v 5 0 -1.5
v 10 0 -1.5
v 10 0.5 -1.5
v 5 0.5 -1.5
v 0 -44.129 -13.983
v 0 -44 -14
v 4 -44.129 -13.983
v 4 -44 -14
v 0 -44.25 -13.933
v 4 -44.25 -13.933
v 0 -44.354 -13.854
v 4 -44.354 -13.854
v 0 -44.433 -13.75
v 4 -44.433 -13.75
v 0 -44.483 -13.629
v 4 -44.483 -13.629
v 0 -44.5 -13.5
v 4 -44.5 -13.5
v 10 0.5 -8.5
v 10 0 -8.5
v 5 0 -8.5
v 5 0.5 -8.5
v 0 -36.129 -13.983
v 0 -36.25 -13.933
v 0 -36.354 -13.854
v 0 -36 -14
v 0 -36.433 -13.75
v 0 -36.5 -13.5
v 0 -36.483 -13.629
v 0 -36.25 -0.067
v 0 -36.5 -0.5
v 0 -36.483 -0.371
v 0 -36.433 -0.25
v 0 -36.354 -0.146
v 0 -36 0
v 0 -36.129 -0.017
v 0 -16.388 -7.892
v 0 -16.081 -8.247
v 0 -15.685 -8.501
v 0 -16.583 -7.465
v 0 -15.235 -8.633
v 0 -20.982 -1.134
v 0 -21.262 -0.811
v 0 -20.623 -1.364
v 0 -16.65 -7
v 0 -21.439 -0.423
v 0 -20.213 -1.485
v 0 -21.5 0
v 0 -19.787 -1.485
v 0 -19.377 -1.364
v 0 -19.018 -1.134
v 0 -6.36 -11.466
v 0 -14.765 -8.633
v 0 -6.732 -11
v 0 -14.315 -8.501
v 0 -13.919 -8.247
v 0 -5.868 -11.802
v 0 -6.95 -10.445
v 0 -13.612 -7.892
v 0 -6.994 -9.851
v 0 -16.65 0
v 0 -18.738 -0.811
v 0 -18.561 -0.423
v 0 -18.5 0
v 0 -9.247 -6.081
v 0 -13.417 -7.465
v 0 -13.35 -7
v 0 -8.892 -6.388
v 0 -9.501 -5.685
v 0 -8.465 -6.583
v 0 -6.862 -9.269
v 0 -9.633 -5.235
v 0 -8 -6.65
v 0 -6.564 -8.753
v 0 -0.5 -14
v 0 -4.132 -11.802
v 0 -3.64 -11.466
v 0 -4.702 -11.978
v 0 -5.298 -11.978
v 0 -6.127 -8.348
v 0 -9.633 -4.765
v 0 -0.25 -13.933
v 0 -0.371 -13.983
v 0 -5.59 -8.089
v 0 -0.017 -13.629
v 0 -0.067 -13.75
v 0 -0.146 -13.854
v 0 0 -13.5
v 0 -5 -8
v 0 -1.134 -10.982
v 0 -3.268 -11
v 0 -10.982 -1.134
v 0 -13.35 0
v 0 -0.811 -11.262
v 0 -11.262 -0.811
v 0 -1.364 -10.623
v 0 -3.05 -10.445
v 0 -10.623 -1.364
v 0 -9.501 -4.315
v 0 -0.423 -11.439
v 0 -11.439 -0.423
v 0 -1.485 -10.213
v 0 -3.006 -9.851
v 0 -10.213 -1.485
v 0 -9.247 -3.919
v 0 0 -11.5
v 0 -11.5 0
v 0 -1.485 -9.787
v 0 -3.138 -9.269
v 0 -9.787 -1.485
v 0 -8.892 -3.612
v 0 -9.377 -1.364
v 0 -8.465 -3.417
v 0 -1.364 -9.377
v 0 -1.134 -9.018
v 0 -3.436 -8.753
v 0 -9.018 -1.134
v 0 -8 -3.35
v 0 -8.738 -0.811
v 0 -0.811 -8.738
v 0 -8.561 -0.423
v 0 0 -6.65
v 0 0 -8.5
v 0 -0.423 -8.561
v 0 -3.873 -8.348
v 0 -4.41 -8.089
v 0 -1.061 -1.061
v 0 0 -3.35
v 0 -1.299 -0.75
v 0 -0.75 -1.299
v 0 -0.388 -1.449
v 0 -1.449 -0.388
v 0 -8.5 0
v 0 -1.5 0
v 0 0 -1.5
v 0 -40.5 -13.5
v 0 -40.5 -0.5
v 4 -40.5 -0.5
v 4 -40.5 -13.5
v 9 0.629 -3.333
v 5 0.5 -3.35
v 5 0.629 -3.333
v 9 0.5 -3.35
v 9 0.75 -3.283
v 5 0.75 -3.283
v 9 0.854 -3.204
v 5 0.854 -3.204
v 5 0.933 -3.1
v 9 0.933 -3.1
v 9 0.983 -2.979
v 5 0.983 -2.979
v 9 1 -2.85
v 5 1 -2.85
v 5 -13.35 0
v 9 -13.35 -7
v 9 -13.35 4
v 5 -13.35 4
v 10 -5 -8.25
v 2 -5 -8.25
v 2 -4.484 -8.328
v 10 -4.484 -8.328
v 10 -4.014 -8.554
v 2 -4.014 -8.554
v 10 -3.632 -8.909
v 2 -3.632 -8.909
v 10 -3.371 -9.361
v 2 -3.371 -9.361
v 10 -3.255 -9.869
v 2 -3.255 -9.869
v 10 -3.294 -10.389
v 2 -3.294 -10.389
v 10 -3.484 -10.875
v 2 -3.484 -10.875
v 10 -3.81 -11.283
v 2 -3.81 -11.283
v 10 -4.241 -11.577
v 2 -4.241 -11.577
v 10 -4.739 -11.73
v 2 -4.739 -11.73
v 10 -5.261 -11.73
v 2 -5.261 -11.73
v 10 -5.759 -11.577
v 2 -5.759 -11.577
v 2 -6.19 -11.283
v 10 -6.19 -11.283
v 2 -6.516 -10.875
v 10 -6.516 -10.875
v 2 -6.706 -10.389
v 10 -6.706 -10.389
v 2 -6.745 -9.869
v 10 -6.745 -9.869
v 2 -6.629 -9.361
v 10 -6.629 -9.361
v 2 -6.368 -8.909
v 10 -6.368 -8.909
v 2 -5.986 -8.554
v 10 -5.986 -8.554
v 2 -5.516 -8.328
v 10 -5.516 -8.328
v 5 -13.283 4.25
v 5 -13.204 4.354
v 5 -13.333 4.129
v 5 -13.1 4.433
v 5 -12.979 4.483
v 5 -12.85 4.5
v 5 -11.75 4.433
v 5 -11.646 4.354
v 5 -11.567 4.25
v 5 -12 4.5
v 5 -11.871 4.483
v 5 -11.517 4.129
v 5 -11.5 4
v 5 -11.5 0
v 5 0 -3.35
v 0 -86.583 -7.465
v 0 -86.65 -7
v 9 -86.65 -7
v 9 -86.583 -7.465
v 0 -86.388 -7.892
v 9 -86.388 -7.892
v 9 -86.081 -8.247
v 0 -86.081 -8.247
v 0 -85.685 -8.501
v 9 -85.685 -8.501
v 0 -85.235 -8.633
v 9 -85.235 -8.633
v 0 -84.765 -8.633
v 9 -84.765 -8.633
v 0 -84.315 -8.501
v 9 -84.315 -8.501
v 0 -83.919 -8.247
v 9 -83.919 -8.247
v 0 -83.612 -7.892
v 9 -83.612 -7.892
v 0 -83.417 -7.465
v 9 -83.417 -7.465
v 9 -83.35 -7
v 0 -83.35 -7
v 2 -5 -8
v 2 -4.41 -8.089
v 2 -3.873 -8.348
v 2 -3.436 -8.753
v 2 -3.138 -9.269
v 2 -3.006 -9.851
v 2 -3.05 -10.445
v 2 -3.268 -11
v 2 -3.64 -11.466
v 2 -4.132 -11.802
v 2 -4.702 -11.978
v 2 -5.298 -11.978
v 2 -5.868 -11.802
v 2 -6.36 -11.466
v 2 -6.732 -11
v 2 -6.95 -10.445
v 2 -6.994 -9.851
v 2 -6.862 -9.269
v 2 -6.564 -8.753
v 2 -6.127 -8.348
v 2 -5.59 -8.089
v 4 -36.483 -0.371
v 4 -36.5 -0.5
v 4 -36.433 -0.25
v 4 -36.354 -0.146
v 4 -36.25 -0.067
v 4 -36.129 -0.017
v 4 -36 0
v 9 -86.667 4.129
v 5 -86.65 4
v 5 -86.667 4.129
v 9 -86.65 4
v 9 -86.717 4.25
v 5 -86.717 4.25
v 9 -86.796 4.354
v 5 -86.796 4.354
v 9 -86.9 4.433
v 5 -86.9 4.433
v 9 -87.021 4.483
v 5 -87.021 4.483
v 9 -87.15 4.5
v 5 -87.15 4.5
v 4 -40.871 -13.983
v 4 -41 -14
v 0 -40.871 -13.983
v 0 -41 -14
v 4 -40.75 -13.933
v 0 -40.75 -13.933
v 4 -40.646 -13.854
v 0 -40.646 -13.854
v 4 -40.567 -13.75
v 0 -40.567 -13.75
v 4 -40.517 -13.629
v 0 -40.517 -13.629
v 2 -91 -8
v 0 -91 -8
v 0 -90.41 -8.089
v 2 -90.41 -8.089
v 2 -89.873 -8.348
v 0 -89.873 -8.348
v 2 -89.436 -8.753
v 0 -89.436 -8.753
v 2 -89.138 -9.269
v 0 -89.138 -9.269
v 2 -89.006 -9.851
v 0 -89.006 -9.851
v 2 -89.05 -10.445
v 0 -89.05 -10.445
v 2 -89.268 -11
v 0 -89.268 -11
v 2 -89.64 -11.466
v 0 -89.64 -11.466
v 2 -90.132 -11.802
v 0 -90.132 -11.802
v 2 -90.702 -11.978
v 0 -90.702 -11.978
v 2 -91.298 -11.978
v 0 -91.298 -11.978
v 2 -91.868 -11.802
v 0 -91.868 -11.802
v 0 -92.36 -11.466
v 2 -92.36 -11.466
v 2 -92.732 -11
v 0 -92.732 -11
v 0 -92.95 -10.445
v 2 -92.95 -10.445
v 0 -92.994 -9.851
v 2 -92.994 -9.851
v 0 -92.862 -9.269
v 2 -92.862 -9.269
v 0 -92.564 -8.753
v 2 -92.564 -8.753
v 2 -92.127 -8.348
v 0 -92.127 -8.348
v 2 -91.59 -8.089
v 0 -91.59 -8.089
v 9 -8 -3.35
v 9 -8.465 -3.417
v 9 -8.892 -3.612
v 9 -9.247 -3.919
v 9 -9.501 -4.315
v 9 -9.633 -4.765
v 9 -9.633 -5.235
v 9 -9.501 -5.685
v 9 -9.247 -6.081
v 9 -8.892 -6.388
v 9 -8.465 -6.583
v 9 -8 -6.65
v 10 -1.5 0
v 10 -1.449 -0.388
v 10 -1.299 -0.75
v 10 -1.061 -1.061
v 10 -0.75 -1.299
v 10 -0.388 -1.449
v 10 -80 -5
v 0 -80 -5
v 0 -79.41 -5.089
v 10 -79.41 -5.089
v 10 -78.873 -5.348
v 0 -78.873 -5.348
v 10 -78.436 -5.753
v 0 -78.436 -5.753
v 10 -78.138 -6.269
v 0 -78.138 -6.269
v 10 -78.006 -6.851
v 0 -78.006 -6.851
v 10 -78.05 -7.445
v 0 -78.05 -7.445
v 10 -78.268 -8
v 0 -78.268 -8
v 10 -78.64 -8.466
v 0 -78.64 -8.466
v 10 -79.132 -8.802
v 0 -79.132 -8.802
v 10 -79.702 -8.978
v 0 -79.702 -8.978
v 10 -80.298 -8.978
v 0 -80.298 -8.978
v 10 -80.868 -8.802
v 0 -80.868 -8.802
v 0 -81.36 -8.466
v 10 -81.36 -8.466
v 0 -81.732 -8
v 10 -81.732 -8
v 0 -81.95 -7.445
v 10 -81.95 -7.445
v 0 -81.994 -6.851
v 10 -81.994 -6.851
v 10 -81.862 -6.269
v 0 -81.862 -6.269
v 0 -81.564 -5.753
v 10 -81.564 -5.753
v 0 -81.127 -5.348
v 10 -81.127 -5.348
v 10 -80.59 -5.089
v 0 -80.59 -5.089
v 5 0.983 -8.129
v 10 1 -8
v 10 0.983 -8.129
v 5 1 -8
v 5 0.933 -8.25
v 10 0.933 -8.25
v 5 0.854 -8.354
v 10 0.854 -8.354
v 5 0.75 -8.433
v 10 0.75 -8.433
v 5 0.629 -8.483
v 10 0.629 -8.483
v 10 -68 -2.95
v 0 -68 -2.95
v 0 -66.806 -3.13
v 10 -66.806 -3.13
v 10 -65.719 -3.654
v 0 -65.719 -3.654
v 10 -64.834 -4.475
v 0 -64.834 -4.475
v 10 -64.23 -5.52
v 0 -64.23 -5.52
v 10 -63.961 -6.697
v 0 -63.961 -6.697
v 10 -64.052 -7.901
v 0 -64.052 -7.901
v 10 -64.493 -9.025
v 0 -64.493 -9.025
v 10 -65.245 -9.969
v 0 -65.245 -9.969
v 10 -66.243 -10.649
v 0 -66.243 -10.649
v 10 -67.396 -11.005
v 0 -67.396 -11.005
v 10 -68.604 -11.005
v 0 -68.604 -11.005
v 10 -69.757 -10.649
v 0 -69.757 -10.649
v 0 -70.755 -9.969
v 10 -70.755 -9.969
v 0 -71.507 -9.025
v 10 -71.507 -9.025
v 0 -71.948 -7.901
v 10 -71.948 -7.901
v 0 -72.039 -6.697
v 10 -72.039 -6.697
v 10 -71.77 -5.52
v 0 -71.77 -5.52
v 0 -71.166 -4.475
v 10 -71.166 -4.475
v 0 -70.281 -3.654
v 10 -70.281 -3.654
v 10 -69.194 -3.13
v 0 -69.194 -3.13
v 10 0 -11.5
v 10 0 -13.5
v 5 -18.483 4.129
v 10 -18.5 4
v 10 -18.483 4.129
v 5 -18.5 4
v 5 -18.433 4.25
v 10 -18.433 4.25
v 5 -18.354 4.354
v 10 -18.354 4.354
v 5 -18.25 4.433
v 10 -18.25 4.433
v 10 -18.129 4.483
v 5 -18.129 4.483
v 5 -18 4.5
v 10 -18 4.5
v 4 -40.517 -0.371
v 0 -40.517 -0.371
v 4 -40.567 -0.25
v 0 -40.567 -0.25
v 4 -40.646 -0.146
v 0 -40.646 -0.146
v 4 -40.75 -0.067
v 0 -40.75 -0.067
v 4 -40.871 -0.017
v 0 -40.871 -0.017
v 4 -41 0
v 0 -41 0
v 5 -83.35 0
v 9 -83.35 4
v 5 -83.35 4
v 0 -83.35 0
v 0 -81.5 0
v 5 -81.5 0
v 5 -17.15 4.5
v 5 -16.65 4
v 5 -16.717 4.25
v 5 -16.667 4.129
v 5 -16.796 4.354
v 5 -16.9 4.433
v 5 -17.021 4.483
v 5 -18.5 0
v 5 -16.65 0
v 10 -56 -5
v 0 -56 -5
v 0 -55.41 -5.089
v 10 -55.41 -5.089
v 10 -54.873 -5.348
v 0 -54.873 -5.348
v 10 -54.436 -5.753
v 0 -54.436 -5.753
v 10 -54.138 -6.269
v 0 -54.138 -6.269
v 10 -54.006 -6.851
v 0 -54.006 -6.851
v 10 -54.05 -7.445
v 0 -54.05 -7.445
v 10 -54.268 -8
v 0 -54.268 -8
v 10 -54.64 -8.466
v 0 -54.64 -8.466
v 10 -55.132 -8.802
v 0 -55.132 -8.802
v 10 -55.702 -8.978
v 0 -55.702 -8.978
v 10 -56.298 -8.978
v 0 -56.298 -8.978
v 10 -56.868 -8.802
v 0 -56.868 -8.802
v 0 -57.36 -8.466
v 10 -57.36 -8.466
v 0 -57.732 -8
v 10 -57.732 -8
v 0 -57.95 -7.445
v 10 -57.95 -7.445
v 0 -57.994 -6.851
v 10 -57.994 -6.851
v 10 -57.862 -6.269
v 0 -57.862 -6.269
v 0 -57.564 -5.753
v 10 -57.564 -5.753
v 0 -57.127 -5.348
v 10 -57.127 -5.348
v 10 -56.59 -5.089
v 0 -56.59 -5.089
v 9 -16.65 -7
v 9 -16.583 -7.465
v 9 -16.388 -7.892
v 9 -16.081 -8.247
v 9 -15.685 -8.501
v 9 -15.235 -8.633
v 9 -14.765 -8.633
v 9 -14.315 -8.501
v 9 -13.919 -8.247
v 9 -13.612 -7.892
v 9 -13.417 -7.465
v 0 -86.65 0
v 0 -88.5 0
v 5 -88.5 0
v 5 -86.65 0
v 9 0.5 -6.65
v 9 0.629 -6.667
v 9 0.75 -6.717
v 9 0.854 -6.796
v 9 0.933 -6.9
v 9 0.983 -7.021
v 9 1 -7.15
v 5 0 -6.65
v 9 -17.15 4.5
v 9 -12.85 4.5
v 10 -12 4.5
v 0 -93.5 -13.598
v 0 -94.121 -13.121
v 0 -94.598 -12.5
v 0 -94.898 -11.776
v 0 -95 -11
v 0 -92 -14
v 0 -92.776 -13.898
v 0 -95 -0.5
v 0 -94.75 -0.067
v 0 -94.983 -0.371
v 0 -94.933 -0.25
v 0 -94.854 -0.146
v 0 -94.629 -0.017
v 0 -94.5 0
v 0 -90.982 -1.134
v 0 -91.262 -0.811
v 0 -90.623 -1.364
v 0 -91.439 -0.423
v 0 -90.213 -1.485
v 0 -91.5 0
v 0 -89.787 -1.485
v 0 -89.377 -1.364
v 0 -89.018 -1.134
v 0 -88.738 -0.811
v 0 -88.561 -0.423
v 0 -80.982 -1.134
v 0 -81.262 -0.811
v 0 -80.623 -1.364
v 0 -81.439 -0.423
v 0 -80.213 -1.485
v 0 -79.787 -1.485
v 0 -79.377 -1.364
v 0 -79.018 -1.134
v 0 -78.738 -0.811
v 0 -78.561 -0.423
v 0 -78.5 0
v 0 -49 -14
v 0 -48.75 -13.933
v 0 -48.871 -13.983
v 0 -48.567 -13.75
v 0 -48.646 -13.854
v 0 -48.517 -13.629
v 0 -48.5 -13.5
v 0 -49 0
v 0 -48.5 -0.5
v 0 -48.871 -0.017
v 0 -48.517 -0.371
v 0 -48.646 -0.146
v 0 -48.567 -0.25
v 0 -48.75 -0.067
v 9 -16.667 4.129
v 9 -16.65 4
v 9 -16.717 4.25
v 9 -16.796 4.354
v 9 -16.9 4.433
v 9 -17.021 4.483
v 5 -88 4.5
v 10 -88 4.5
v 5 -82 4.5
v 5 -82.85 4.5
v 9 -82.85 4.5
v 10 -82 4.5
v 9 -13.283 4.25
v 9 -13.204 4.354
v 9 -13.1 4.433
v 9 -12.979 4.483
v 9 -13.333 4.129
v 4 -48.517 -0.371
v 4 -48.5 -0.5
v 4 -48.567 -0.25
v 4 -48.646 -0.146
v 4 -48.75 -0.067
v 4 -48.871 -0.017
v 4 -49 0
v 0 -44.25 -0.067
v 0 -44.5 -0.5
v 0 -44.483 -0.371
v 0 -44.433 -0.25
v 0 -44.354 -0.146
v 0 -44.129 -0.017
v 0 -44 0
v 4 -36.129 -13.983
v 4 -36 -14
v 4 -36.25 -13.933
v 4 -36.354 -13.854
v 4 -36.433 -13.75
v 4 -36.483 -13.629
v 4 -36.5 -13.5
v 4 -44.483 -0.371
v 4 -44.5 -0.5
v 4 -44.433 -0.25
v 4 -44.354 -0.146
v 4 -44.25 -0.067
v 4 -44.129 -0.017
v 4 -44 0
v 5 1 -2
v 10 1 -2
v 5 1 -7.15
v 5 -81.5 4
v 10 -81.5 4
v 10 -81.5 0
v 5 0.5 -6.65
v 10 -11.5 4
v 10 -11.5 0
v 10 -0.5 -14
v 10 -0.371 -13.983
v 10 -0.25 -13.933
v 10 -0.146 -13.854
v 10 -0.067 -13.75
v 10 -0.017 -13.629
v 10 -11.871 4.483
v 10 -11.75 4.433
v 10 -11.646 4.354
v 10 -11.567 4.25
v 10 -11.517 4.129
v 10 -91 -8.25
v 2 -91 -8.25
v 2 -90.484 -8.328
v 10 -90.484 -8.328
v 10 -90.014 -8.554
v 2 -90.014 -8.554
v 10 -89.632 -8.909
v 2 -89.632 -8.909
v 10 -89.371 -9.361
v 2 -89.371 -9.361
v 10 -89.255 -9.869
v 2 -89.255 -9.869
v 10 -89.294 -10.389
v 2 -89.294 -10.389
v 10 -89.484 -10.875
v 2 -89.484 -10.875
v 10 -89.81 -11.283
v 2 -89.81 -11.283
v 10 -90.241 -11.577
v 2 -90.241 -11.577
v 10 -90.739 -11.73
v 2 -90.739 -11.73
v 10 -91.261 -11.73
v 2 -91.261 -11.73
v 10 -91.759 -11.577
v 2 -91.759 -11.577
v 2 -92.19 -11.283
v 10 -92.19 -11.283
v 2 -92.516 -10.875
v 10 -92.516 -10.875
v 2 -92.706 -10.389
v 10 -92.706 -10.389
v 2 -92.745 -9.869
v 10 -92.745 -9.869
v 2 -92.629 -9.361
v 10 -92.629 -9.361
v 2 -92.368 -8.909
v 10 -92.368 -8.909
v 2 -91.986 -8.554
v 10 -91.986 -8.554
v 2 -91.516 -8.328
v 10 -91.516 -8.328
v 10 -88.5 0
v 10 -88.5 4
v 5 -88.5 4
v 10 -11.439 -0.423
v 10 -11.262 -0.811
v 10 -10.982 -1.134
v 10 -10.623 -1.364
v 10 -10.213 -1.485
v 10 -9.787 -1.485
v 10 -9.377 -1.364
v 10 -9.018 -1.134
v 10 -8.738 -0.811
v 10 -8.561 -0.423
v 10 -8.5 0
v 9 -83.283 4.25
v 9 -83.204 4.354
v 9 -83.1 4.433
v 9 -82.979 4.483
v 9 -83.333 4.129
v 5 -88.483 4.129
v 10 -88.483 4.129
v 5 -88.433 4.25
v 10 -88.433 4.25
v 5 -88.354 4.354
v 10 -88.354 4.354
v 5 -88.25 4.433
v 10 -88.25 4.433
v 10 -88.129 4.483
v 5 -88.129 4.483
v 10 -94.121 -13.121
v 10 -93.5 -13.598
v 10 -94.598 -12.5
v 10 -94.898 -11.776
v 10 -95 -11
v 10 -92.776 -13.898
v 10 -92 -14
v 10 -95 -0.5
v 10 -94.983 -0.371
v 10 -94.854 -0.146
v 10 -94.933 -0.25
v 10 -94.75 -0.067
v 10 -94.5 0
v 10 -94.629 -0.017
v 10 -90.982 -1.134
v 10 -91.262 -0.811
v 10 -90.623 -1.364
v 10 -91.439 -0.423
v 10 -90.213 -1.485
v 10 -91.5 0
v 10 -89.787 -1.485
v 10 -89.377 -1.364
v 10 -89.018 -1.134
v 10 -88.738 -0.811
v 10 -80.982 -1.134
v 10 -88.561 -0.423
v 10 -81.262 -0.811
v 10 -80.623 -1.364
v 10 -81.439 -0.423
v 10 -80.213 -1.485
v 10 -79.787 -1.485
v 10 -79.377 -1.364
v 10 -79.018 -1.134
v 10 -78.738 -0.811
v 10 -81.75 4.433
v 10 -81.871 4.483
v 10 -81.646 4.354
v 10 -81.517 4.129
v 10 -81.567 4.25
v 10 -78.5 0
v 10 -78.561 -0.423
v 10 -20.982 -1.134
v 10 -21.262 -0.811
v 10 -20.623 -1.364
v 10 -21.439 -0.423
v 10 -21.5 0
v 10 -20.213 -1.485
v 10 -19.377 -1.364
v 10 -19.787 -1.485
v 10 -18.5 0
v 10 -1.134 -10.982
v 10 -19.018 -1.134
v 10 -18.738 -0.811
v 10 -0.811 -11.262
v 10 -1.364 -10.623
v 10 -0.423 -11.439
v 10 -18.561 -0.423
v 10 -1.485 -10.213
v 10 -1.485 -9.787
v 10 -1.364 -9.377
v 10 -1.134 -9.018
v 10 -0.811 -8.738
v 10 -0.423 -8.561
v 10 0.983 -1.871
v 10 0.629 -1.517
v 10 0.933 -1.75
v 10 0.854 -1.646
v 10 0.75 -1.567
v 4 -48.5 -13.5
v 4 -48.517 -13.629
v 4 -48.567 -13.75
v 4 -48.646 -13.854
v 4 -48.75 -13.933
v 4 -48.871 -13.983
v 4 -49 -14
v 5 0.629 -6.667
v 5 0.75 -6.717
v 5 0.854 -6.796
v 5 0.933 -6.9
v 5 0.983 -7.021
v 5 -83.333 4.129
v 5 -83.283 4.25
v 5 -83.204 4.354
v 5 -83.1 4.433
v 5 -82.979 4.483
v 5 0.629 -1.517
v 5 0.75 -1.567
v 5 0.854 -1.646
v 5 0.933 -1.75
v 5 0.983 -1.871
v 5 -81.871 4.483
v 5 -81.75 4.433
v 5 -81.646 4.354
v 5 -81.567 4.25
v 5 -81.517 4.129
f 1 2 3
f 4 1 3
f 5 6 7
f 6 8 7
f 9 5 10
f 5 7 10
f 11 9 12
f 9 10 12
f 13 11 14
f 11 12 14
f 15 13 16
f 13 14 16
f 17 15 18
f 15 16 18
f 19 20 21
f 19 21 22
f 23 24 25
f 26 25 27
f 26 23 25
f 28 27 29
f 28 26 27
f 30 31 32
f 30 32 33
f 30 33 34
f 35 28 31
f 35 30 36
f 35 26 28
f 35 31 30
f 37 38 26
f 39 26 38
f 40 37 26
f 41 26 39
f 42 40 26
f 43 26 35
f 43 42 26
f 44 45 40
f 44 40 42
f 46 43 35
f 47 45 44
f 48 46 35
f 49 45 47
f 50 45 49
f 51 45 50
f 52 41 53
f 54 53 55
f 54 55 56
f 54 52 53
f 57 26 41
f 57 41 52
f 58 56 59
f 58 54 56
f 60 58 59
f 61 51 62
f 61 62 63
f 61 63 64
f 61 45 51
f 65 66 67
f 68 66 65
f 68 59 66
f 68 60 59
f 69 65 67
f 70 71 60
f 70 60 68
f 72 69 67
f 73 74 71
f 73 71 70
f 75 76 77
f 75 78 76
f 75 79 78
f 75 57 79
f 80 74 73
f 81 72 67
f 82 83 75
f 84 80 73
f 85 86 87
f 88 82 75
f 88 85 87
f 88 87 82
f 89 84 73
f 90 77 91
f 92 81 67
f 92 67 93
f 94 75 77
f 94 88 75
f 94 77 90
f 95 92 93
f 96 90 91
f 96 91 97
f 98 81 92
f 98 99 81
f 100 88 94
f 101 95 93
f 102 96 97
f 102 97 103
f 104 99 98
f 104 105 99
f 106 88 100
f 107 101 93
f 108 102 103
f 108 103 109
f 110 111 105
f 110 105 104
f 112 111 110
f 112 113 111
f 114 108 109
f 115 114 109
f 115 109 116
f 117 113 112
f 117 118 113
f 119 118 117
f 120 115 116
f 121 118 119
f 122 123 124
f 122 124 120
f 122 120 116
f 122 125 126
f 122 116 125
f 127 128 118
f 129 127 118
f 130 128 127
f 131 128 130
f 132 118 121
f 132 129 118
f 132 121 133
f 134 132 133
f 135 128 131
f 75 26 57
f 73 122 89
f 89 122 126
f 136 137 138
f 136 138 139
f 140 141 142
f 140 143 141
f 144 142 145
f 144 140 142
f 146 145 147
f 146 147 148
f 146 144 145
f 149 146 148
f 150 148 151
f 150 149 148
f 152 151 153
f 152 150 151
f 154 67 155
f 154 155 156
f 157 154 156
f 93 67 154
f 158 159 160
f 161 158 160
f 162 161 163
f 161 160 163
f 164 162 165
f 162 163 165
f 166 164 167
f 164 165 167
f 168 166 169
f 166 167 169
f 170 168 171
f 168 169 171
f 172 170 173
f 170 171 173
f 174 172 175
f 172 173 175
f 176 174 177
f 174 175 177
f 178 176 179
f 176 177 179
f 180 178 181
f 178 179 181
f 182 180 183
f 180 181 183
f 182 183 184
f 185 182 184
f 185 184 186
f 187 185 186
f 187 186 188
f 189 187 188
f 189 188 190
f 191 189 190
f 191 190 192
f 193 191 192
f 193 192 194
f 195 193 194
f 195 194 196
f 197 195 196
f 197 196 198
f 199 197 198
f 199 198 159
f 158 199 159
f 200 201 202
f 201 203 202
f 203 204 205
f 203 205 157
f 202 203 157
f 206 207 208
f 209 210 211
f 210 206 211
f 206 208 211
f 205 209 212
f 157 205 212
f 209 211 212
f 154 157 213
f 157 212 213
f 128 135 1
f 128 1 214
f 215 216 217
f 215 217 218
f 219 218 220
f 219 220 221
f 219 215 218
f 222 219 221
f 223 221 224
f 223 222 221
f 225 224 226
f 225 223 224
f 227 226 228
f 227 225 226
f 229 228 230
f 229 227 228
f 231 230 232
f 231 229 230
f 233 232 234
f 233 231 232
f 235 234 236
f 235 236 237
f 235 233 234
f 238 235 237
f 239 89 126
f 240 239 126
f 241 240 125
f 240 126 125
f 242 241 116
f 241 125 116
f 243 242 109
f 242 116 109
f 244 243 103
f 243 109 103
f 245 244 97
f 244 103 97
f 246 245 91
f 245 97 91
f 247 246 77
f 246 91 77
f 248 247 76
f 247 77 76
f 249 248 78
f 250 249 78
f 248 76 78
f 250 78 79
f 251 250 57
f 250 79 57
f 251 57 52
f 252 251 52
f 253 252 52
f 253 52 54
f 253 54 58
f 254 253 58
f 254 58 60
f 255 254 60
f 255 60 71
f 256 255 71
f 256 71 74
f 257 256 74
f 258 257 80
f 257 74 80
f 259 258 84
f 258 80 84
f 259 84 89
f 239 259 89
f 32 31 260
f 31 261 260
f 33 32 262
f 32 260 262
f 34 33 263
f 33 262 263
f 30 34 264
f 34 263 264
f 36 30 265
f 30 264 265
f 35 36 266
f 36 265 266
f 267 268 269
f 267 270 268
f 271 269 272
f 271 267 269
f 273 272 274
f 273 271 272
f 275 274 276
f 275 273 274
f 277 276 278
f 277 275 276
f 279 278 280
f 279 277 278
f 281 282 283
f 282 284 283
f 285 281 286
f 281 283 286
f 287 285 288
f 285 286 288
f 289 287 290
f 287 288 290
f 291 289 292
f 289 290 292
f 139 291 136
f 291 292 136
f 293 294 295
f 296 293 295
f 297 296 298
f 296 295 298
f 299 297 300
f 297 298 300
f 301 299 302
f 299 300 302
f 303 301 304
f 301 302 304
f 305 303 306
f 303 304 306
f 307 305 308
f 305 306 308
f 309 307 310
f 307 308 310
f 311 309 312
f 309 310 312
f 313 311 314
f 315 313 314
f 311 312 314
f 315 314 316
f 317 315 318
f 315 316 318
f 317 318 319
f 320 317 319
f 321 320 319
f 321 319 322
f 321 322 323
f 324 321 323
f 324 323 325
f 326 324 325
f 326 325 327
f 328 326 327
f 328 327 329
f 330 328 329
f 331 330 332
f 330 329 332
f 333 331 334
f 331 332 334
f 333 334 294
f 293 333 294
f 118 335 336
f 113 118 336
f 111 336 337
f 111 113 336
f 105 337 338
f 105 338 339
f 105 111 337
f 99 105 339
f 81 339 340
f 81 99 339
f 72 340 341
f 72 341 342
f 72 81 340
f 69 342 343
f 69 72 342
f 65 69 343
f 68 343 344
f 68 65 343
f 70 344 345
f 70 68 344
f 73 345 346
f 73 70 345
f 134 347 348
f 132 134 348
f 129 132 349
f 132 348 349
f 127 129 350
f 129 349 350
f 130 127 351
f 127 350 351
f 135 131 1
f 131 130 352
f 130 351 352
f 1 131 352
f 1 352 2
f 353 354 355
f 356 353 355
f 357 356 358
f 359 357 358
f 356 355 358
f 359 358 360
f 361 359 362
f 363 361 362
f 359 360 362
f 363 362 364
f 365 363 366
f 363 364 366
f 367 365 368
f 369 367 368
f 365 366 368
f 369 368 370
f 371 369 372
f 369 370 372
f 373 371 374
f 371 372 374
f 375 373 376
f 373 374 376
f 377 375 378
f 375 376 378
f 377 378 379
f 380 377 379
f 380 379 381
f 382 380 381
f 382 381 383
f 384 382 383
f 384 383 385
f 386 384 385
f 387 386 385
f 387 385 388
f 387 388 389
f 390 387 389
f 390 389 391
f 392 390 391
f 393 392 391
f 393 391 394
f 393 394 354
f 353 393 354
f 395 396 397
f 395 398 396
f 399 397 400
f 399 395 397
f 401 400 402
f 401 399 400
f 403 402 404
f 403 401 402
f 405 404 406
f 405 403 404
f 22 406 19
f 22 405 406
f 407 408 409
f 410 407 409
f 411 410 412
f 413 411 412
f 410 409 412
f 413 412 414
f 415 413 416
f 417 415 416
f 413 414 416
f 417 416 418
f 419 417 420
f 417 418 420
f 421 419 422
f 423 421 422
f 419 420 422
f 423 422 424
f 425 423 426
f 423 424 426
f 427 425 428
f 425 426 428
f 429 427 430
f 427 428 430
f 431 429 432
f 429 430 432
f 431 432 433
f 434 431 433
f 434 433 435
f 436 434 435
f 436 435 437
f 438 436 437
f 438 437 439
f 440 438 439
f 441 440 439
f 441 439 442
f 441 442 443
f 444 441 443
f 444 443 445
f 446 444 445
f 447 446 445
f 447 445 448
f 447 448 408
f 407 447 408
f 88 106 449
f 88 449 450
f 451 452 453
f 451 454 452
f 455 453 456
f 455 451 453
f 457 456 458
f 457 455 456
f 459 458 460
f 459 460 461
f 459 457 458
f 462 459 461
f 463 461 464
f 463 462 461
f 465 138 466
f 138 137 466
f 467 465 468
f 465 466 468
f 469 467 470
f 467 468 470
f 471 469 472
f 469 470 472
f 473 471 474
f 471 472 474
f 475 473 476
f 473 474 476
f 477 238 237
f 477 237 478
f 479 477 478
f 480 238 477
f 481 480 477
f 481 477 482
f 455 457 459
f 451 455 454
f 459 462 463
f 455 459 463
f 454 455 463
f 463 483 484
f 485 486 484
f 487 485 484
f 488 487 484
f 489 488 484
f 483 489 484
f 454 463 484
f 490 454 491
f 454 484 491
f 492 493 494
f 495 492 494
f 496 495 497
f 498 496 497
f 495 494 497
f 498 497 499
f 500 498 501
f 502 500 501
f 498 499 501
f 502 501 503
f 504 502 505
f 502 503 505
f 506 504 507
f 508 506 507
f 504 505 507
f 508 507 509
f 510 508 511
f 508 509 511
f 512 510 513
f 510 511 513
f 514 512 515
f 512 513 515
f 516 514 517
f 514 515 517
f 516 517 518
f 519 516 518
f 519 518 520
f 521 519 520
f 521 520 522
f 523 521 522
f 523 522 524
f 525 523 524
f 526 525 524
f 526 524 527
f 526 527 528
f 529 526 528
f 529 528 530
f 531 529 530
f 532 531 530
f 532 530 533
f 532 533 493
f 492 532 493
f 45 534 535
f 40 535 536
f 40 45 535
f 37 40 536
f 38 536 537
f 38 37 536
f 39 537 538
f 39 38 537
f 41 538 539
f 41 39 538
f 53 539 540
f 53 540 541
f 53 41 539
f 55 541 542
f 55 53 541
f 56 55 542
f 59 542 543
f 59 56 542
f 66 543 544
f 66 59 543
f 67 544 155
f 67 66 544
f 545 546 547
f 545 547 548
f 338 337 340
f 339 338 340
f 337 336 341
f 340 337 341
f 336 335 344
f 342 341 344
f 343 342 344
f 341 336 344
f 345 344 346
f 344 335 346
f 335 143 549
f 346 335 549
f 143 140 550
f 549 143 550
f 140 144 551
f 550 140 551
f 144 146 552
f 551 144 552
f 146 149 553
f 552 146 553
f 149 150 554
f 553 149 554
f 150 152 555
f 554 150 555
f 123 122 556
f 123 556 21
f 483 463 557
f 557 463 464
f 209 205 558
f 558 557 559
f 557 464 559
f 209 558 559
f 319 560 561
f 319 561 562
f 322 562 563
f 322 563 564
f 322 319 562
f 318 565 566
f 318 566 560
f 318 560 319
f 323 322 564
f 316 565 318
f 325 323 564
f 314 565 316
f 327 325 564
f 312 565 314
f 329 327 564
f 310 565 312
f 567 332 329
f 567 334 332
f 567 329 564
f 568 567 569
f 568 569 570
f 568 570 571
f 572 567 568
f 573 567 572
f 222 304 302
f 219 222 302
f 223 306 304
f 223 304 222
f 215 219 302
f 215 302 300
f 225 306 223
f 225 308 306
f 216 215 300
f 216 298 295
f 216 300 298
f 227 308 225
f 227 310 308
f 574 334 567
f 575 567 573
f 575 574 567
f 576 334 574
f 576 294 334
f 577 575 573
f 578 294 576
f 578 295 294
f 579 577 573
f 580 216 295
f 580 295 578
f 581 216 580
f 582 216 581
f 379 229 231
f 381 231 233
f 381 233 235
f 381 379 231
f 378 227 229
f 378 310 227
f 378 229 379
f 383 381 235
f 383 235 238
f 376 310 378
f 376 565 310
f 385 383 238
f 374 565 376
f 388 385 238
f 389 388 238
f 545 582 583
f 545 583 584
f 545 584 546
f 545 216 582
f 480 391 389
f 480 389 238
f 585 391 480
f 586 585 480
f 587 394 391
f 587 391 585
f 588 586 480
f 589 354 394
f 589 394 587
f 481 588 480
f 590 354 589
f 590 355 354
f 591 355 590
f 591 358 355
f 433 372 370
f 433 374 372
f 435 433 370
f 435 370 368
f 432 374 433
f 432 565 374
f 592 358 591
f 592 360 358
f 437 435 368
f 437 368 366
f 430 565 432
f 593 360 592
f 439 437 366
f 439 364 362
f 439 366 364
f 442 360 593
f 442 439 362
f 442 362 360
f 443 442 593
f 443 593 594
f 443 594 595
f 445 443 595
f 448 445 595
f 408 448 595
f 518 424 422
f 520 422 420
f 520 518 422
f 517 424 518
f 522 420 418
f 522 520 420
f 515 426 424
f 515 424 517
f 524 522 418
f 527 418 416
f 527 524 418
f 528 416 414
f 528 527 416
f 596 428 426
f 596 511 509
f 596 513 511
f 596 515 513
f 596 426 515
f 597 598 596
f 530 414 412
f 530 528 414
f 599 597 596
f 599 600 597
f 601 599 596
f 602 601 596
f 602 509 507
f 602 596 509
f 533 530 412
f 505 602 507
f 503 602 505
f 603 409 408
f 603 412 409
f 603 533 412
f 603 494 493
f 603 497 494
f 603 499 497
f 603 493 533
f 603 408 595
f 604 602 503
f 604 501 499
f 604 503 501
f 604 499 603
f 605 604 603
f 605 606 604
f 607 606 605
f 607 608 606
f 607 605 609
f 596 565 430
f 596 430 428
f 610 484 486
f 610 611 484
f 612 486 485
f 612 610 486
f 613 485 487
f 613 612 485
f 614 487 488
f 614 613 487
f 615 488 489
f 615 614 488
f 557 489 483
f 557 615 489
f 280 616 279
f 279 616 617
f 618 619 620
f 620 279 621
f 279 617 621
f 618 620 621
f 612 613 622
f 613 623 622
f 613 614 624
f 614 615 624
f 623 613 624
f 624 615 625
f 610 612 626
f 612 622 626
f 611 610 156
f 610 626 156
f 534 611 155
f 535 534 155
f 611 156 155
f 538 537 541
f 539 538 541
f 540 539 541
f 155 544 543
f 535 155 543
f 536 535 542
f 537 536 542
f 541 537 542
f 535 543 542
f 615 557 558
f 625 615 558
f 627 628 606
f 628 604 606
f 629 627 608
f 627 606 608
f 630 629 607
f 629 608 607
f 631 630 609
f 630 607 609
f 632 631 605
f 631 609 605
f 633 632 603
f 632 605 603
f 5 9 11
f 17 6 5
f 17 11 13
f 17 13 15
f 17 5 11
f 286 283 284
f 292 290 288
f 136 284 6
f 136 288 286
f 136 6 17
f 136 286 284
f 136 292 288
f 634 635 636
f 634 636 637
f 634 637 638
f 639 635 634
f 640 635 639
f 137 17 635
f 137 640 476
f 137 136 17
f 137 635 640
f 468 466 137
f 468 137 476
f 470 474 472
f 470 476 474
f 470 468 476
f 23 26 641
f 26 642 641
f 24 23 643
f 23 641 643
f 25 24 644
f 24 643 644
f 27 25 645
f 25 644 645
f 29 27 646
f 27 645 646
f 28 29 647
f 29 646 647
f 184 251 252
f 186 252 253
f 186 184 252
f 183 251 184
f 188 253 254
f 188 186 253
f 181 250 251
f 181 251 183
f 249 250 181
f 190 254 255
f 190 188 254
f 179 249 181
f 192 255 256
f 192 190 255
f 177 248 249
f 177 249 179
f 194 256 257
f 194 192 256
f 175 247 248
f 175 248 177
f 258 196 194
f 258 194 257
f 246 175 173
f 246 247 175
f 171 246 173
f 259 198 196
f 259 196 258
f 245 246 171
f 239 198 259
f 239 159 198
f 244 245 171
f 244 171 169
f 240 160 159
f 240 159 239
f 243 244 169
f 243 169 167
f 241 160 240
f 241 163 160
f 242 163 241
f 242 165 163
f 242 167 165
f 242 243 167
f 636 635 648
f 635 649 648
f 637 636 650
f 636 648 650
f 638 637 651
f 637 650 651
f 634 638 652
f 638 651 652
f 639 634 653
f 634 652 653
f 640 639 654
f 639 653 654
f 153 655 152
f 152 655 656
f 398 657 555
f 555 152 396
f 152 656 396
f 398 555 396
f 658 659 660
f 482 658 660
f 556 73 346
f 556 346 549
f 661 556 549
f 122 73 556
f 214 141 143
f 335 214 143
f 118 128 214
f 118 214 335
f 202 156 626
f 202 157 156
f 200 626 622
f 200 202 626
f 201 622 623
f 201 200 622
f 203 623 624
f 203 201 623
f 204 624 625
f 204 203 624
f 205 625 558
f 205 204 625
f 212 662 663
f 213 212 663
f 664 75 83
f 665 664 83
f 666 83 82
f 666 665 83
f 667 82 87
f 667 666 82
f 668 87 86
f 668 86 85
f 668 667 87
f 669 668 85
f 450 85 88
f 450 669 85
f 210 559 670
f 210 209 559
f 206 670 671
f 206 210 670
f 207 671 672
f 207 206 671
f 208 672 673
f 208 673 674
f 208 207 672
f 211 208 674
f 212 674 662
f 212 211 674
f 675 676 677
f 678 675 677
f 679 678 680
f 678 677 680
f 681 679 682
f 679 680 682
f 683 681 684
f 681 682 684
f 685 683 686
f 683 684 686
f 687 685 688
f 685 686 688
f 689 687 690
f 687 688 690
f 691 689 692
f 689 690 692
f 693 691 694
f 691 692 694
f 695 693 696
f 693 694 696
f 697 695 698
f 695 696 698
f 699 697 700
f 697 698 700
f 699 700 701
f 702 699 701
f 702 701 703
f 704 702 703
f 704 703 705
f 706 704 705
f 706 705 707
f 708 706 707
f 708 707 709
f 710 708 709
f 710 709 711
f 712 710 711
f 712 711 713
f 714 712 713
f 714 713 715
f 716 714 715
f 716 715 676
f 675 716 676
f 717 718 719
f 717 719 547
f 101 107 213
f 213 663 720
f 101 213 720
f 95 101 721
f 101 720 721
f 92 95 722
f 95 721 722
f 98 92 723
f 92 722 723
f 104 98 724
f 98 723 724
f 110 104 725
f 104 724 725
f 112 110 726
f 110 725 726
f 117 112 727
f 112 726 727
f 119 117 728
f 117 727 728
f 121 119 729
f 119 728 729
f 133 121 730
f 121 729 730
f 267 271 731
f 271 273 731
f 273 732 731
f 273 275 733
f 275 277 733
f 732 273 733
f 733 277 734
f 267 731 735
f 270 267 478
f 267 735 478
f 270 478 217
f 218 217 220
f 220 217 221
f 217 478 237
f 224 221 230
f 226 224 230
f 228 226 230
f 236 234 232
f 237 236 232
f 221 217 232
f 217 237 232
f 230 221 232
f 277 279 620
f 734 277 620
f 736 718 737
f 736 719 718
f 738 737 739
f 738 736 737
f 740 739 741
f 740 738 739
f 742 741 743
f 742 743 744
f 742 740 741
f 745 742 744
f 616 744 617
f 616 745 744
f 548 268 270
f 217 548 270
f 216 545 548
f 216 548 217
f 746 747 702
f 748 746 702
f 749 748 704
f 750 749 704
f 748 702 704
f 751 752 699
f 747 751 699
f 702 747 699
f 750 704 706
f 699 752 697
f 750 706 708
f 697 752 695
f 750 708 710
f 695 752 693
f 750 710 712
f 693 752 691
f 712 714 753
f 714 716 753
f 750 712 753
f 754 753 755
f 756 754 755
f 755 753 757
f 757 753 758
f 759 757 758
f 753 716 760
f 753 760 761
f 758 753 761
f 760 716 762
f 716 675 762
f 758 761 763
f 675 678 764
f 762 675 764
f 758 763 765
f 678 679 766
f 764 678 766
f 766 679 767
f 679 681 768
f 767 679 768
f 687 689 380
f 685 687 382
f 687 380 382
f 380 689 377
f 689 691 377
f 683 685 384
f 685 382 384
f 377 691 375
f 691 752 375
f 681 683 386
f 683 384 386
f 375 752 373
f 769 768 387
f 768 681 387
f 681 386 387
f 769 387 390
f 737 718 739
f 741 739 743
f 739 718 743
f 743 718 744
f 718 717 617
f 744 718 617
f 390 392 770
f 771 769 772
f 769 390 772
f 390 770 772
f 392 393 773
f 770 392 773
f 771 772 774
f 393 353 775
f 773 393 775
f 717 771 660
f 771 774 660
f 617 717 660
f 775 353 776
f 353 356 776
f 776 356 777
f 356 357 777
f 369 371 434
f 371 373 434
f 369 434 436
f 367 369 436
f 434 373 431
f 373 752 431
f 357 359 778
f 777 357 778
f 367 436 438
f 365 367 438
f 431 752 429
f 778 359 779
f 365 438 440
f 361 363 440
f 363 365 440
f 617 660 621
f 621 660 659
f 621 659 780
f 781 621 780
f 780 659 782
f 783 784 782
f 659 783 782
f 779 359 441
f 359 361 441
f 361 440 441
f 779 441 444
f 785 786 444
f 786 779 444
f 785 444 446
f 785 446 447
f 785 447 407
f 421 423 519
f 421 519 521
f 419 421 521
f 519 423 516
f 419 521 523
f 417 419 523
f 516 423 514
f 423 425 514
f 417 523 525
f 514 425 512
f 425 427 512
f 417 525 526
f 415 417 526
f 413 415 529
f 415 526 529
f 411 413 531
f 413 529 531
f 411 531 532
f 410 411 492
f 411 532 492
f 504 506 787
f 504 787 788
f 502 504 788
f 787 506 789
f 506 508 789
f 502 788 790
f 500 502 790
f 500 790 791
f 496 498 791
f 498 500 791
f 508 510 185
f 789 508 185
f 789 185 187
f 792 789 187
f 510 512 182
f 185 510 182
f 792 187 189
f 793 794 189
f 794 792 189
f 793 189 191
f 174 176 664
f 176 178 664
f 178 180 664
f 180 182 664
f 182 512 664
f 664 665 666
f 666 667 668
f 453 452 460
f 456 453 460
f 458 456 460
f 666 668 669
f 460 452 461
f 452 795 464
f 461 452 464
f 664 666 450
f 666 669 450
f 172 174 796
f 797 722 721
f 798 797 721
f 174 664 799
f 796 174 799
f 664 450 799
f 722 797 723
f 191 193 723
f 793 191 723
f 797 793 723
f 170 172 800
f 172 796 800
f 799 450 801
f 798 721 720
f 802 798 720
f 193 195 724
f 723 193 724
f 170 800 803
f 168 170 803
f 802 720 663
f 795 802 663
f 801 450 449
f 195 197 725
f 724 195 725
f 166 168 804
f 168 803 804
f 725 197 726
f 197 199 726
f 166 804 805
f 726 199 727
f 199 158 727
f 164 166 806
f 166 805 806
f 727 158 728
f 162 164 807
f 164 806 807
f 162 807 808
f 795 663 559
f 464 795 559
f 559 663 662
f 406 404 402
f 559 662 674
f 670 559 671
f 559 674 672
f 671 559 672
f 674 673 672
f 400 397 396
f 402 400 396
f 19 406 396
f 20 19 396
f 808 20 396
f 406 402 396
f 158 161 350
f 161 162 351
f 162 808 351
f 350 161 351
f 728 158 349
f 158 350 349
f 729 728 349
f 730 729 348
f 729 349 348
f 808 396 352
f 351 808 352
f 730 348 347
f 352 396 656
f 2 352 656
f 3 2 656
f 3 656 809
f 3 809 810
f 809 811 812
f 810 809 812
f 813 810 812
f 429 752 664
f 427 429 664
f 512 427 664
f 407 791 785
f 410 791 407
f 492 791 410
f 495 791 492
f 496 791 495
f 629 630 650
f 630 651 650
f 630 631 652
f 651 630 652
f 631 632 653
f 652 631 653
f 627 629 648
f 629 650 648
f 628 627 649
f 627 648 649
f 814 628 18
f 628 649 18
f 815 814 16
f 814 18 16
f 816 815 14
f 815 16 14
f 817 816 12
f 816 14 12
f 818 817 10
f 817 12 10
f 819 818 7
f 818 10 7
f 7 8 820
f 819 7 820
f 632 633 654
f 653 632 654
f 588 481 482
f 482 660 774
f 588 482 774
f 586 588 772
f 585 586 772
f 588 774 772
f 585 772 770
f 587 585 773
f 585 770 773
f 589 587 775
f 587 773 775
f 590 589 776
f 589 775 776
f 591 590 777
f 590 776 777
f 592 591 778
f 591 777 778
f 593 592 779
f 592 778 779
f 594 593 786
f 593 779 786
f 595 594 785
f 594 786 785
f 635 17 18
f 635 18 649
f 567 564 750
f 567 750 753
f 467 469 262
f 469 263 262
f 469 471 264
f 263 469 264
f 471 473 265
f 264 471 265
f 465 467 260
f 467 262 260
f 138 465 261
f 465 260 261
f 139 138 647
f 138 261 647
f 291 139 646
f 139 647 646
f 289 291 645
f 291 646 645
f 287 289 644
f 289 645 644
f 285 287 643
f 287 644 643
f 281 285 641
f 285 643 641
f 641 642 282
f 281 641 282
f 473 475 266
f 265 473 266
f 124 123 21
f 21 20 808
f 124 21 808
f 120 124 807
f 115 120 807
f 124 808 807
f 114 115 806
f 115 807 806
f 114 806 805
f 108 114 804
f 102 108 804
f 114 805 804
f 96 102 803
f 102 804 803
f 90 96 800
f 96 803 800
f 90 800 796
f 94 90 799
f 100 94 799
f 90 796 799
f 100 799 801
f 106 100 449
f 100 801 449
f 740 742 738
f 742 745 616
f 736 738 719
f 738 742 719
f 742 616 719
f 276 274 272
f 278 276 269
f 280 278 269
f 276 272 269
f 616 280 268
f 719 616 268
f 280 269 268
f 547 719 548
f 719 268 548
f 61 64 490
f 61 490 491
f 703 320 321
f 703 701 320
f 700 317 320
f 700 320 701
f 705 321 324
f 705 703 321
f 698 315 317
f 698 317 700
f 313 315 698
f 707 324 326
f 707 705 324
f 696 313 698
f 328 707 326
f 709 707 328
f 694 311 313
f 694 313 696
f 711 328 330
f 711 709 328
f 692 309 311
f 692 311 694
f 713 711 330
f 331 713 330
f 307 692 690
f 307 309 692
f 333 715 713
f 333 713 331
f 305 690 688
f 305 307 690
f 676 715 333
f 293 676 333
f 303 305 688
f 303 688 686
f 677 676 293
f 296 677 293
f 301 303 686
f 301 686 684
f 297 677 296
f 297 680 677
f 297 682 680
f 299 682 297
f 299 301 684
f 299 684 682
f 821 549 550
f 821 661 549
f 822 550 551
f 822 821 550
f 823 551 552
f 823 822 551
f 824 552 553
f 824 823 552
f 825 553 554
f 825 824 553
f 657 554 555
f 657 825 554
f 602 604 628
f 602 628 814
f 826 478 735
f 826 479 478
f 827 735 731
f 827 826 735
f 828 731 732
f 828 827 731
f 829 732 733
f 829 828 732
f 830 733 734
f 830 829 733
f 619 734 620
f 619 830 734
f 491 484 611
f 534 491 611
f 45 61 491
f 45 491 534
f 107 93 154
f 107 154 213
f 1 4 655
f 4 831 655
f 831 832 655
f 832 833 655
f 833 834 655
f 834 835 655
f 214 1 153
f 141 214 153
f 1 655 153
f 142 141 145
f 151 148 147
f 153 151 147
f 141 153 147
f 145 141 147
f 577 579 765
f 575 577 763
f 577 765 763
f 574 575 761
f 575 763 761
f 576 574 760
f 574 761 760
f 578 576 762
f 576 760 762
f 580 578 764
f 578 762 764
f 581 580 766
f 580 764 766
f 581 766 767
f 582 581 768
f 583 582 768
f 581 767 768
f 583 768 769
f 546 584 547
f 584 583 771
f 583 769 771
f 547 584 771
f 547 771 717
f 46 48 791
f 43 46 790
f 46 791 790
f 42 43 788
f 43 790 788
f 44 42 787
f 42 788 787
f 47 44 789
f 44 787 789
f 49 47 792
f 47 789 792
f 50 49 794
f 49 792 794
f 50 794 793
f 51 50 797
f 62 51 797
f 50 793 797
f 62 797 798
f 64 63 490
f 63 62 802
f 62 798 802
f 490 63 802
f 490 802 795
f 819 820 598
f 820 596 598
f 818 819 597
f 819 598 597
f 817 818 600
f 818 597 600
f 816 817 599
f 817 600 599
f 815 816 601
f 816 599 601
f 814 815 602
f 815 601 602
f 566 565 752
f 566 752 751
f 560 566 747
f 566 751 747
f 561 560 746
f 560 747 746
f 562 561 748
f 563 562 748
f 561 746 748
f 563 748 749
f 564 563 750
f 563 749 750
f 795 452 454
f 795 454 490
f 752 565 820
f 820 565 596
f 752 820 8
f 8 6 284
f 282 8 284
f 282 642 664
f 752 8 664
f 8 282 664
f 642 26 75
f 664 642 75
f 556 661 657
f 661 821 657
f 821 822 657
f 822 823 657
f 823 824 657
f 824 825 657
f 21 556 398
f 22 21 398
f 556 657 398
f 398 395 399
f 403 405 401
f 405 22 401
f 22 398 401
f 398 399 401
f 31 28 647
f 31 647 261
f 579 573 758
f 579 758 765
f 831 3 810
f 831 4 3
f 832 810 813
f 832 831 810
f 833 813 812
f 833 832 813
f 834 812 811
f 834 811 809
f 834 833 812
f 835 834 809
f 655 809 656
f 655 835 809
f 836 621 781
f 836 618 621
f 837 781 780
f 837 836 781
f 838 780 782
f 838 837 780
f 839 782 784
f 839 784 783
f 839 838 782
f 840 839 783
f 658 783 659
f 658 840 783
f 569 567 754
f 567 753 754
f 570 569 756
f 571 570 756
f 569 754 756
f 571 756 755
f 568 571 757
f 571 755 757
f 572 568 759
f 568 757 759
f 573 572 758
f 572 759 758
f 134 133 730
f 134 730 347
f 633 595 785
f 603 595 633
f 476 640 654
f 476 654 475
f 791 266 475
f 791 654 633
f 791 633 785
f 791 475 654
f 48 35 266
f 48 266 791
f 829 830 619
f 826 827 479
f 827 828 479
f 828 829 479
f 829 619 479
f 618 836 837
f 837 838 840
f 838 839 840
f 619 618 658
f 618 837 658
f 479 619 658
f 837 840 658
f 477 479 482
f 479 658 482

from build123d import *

# Parameters (mm, degrees)
BOSS_EXTRUDE3_DEPTH = 10
SKETCH19_R          = 2
SKETCH19_R_2        = 4.05
CUT_EXTRUDE13_DEPTH = 97.545326143
SKETCH24_R          = 1.75
CUT_EXTRUDE17_DEPTH = 10
SKETCH30_W          = 4.5
SKETCH30_H          = 7
SKETCH30_W_2        = 7
SKETCH30_H_2        = 1
BOSS_EXTRUDE4_DEPTH = 5
CUT_EXTRUDE19_DEPTH = 9
CUT_EXTRUDE21_DEPTH = 4
SKETCH31_R          = 1.5
CUT_EXTRUDE24_DEPTH = 97.545326143
SKETCH29_R          = 2
CUT_EXTRUDE23_DEPTH = 2
FILLET2_R           = 0.5
FILLET1_R           = 3


with BuildPart() as part:
    # Sketch17 → Boss-Extrude3 (new body)
    with BuildSketch(Plane(origin=(0, 0, 0), x_dir=(0, 0, -1), z_dir=(1, 0, 0))):
        Polygon((14, -60), (14, -95), (0, -95), (0, 0), (14, 0), (14, -45), align=None)
    extrude(amount=BOSS_EXTRUDE3_DEPTH)

    # Sketch19 → Cut-Extrude13 (cut, through all)
    with BuildSketch(Plane.ZY):
        with Locations((-7, -56)):
            Circle(SKETCH19_R)
        with Locations((-7, -68)):
            Circle(SKETCH19_R_2)
        with Locations((-7, -80)):
            Circle(SKETCH19_R)
    extrude(amount=-CUT_EXTRUDE13_DEPTH, mode=Mode.SUBTRACT)

    # Sketch24 → Cut-Extrude17 (cut)
    with BuildSketch(Plane.ZY):
        with Locations((-10, -5)):
            Circle(SKETCH24_R)
        with Locations((-10, -91)):
            Circle(SKETCH24_R)
    extrude(amount=-CUT_EXTRUDE17_DEPTH, mode=Mode.SUBTRACT)

    # Sketch30 → Boss-Extrude4 (add)
    with BuildSketch(Plane(origin=(10, 0, 0), x_dir=(0, 0, -1), z_dir=(1, 0, 0))):
        with Locations((-2.25, -15)):
            Rectangle(SKETCH30_W, SKETCH30_H)
        with Locations((-2.25, -85)):
            Rectangle(SKETCH30_W, SKETCH30_H)
        with Locations((5, 0.5)):
            Rectangle(SKETCH30_W_2, SKETCH30_H_2)
    extrude(amount=-BOSS_EXTRUDE4_DEPTH)

    # Sketch26 → Cut-Extrude19 (cut)
    with BuildSketch(Plane.ZY):
        with BuildLine():
            Line((-7, -13.35), (7, -13.35))
            ThreePointArc((7, -13.35), (8.65, -15), (7, -16.65))
            Line((7, -16.65), (-7, -16.65))
            ThreePointArc((-7, -16.65), (-8.65, -15), (-7, -13.35))
        make_face()
        with BuildLine():
            Line((-7, -83.35), (7, -83.35))
            ThreePointArc((7, -83.35), (8.65, -85), (7, -86.65))
            Line((7, -86.65), (-7, -86.65))
            ThreePointArc((-7, -86.65), (-8.65, -85), (-7, -83.35))
        make_face()
        with BuildLine():
            Line((-3.35, 8), (-3.35, -8))
            ThreePointArc((-3.35, -8), (-5, -9.65), (-6.65, -8))
            Line((-6.65, -8), (-6.65, 8))
            ThreePointArc((-6.65, 8), (-5, 9.65), (-3.35, 8))
        make_face()
    extrude(amount=-CUT_EXTRUDE19_DEPTH, mode=Mode.SUBTRACT)

    # Sketch27 → Cut-Extrude21 (cut)
    with BuildSketch(Plane.ZY):
        with BuildLine():
            Line((-22.181406925, -44.5), (2.318593075, -44.5))
            ThreePointArc((2.318593075, -44.5), (2.672146466, -44.646446609), (2.818593075, -45))
            Line((2.818593075, -45), (2.818593075, -48))
            ThreePointArc((2.818593075, -48), (2.672146466, -48.353553391), (2.318593075, -48.5))
            Line((2.318593075, -48.5), (-22.181406925, -48.5))
            Line((-22.181406925, -48.5), (-22.181406925, -44.5))
        make_face()
        with BuildLine():
            Line((-22.181406925, -36.5), (2.74769439, -36.5))
            ThreePointArc((2.74769439, -36.5), (2.783233621, -36.501264636), (2.818593075, -36.505052148))
            Line((2.818593075, -36.505052148), (2.818593075, -39.642901183))
            ThreePointArc((2.818593075, -39.642901183), (2.931519183, -40.189011364), (2.468621026, -40.5))
            Line((2.468621026, -40.5), (-22.181406925, -40.5))
            Line((-22.181406925, -40.5), (-22.181406925, -36.5))
        make_face()
    extrude(amount=-CUT_EXTRUDE21_DEPTH, mode=Mode.SUBTRACT)

    # Sketch31 → Cut-Extrude24 (cut, through all)
    with BuildSketch(Plane(origin=(10, 0, 0), x_dir=(0, 0, -1), z_dir=(1, 0, 0))):
        with Locations((0, -90)):
            Circle(SKETCH31_R)
        with Locations((0, -80)):
            Circle(SKETCH31_R)
        with Locations((0, -20)):
            Circle(SKETCH31_R)
        with Locations((0, -10)):
            Circle(SKETCH31_R)
        with Locations((10, 0)):
            Circle(SKETCH31_R)
        Circle(SKETCH31_R)
    extrude(amount=-CUT_EXTRUDE24_DEPTH, mode=Mode.SUBTRACT)

    # Sketch29 → Cut-Extrude23 (cut)
    with BuildSketch(Plane.ZY):
        with Locations((-10, -5)):
            Circle(SKETCH29_R)
        with Locations((-10, -91)):
            Circle(SKETCH29_R)
    extrude(amount=-CUT_EXTRUDE23_DEPTH, mode=Mode.SUBTRACT)

    # Fillet2
    fillet2_edges = [part.edges().sort_by_distance(p)[0] for p in [
        (2, -48.5, -14),
        (2, -44.5, -14),
        (2, -48.5, 0),
        (2, -44.5, 0),
        (5, 0, -14),
        (5, -95, 0),
        (2, -36.5, -14),
        (2, -40.5, -14),
        (2, -36.5, 0),
        (2, -40.5, 0),
        (7.5, 1, -8.5),
        (7, 1, -6.65),
        (7, 1, -3.35),
        (7.5, 1, -1.5),
        (7.5, -81.5, 4.5),
        (7, -83.35, 4.5),
        (7, -86.65, 4.5),
        (7.5, -88.5, 4.5),
        (7.5, -11.5, 4.5),
        (7.5, -18.5, 4.5),
        (7, -13.35, 4.5),
        (7, -16.65, 4.5),
    ]]
    fillet(fillet2_edges, radius=FILLET2_R)

    # Fillet1
    fillet1_edges = [part.edges().sort_by_distance(p)[0] for p in [
        (5, -95, -14),
    ]]
    fillet(fillet1_edges, radius=FILLET1_R)


solid = part.part
